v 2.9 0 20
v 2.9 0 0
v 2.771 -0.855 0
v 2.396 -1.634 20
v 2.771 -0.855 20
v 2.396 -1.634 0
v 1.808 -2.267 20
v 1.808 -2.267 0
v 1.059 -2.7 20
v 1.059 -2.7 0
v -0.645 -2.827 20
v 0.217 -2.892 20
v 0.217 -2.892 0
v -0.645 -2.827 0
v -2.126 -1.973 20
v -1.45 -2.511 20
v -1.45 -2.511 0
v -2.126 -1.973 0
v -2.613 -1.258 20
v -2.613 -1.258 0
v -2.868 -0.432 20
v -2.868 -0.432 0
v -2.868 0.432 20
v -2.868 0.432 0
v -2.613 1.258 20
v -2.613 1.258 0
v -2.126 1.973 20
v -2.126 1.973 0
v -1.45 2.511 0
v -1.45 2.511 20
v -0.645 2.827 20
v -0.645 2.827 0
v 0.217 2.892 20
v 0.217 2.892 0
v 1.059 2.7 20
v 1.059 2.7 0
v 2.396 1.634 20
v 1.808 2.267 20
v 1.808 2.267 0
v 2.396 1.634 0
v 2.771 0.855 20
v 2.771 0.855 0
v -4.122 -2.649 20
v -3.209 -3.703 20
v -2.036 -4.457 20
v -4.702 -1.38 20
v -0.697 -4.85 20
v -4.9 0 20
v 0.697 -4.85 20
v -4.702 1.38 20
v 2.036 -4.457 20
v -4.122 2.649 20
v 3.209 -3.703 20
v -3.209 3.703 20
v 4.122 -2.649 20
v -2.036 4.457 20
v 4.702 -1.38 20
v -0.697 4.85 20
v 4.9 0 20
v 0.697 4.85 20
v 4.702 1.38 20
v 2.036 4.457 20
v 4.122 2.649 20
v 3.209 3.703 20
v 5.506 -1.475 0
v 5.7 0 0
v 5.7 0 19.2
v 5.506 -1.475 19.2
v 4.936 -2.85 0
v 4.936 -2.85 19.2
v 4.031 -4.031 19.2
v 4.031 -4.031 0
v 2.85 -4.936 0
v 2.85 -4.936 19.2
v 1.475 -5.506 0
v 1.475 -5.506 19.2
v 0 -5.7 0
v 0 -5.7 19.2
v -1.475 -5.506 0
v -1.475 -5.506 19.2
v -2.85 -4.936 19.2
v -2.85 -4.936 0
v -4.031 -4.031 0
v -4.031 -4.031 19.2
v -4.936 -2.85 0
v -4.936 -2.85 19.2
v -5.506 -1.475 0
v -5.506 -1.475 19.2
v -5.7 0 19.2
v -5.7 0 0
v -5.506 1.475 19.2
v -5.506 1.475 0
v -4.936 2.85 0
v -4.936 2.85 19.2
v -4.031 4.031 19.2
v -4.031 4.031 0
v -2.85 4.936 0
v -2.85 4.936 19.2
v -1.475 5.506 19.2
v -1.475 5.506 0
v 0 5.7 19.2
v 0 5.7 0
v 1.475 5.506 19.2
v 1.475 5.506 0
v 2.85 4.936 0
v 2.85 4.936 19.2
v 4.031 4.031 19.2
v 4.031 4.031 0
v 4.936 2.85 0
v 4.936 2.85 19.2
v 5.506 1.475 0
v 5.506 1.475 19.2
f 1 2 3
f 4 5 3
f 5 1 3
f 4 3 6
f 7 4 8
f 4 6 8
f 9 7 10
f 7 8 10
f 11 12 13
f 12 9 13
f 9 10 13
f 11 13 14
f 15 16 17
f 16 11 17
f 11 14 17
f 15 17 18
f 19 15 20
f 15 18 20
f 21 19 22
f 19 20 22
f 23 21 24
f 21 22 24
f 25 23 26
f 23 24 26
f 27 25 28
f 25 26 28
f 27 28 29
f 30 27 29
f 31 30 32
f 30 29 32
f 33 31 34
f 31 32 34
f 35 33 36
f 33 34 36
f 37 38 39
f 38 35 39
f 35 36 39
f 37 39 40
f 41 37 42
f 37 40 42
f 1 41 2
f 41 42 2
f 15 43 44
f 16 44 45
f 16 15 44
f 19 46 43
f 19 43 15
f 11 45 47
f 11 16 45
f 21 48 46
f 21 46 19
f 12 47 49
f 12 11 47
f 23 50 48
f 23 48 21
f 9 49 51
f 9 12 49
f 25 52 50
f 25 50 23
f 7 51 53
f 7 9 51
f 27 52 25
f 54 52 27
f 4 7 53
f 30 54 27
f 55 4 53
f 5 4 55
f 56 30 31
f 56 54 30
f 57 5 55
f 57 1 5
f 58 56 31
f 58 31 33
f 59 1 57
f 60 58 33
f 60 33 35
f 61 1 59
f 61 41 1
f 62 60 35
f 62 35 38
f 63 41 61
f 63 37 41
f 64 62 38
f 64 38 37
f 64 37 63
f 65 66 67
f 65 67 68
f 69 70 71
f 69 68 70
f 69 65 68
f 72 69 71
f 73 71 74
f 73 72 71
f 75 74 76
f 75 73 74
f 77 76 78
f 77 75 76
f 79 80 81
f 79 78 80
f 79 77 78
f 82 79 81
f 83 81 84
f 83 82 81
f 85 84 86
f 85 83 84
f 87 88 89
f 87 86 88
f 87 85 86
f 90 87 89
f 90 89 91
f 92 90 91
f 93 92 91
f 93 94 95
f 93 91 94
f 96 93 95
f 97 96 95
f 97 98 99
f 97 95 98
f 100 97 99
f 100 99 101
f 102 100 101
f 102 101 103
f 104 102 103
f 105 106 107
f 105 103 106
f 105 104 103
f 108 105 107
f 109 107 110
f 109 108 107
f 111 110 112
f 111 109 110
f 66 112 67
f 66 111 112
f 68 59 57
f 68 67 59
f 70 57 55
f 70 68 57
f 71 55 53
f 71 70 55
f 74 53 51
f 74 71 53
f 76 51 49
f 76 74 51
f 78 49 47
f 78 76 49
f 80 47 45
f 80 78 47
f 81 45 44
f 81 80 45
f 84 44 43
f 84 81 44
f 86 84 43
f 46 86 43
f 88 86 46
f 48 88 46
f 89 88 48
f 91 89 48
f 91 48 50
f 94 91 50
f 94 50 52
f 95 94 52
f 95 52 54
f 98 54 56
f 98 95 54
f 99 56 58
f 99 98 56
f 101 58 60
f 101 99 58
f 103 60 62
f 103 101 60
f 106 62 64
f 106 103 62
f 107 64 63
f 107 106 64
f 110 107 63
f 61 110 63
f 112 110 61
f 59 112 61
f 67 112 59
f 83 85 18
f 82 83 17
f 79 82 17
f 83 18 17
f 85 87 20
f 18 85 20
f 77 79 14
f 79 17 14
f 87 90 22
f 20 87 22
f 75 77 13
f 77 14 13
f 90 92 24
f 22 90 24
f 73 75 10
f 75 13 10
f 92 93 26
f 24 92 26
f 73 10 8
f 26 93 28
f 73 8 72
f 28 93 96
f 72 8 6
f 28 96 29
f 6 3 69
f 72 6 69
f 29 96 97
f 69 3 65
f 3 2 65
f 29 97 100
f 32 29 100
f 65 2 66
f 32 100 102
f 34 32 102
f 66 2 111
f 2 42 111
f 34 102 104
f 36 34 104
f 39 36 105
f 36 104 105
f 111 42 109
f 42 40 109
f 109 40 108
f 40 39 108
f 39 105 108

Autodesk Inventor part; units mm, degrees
ref_plane "YZ Plane" through (0, 0, 0) normal (1, 0, 0) x (0, 1, 0)
ref_plane "XZ Plane" through (0, 0, 0) normal (0, 1, 0) x (-1, 0, 0)
ref_plane "XY Plane" through (0, 0, 0) normal (0, 0, 1) x (1, 0, 0)
sketch "Sketch1" plane through (0, 0, 0) normal (0, 0, 1) x (1, 0, 0)
  circle A0 centre (0, 0) radius 5.7
  dimension "d0" = 11.4
extrude "Extrusion1" add sketch "Sketch1" along normal blind 20
chamfer "Chamfer1" distance 0.8 angle 45 1 edges at (-5.7, 0, 20)
sketch "Sketch2" plane through (0, 0, 0) normal (0, 0, 1) x (1, 0, 0)
  circle A0 centre (0, 0) radius 2.9
  dimension "d6" = 5.8
extrude "Extrusion2" cut sketch "Sketch2" along normal up to surface (20 mm away)
properties part number "Insert20mm"
